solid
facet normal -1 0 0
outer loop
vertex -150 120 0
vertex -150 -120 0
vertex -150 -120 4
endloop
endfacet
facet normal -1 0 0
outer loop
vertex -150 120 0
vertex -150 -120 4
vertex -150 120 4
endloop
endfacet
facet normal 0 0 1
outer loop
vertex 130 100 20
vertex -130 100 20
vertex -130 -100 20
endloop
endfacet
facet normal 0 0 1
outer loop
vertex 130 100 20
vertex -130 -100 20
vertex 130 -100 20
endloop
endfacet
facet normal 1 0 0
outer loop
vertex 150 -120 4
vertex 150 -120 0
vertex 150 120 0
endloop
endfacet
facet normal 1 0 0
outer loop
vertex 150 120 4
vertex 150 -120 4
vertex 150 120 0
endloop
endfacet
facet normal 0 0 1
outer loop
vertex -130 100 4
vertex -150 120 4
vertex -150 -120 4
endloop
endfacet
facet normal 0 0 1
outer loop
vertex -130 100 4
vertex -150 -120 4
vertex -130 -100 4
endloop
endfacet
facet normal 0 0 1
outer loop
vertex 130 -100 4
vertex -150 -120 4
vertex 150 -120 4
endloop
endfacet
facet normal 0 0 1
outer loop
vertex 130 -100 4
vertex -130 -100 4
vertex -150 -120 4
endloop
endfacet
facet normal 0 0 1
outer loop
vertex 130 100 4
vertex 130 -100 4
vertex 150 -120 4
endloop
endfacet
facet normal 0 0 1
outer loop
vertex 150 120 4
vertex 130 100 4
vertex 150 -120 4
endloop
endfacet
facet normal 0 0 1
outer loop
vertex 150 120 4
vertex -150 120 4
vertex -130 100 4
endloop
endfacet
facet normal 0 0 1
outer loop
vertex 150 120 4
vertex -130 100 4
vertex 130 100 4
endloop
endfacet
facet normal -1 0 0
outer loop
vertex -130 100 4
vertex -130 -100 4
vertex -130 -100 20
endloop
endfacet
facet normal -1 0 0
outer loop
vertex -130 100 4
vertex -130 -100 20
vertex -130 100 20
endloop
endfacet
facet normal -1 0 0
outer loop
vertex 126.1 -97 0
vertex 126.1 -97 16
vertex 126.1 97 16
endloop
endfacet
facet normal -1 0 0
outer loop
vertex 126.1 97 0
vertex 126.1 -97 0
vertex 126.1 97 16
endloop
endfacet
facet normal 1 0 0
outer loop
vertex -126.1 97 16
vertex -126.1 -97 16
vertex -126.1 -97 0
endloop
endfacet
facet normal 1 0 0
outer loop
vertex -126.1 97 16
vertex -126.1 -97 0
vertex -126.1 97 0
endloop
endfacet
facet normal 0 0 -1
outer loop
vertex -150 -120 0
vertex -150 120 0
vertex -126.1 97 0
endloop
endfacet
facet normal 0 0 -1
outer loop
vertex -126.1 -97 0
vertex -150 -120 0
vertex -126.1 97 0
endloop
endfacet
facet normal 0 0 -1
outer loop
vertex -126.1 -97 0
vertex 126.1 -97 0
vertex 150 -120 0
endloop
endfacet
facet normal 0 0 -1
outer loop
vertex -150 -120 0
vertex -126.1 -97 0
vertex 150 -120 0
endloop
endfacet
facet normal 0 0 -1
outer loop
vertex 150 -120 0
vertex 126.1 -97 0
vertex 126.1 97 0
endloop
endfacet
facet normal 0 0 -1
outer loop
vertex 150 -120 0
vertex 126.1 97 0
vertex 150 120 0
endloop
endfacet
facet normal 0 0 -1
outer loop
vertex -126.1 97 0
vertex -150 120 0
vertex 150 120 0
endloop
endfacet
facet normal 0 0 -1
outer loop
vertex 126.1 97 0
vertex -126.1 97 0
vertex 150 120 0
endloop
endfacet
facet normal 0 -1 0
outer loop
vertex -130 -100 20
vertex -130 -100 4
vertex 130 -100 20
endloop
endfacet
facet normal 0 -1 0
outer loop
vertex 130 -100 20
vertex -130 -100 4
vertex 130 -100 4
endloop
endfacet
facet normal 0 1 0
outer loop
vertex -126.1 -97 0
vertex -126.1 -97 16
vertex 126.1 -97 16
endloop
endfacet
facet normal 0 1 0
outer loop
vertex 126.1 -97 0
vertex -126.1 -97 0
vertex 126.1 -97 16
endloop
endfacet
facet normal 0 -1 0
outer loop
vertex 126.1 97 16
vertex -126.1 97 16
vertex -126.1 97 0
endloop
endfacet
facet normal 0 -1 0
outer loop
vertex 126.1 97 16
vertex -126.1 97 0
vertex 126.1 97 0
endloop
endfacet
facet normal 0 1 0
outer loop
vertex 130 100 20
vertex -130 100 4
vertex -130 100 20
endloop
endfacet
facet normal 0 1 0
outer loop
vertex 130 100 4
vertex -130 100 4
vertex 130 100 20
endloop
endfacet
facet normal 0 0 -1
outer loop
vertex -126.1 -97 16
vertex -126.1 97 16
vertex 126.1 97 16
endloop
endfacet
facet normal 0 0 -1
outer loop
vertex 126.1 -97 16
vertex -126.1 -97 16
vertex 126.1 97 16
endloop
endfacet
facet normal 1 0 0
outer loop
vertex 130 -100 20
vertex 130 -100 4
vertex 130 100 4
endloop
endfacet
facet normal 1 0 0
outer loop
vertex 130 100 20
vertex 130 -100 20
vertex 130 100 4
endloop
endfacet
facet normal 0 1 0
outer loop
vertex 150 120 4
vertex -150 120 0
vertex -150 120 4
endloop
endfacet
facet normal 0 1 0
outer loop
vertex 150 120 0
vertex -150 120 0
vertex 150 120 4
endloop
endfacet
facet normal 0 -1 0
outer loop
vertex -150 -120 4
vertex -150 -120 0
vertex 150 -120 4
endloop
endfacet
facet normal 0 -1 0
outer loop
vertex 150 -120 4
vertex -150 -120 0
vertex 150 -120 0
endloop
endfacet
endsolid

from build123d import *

# Parameters (mm, degrees)
SKETCH1_W                = 300
SKETCH1_H                = 240
SKETCH1_W_2              = 260
SKETCH1_H_2              = 200
BOSS_EXTRUDE1_DEPTH      = 4
SKETCH2_W                = 260
SKETCH2_H                = 200
SKETCH2_W_2              = 252.2
SKETCH2_H_2              = 194
BOSS_EXTRUDE3_DEPTH      = 16
BOSS_EXTRUDE3_DEPTH_BACK = 4
SKETCH4_W                = 252.2
SKETCH4_H                = 194
BOSS_EXTRUDE4_DEPTH      = 4


with BuildPart() as part:
    # Sketch1 → Boss-Extrude1 (new body)
    with BuildSketch(Plane.XY):
        Rectangle(SKETCH1_W, SKETCH1_H)
        Rectangle(SKETCH1_W_2, SKETCH1_H_2, mode=Mode.SUBTRACT)
    extrude(amount=BOSS_EXTRUDE1_DEPTH)

    # Sketch2 → Boss-Extrude3 (add, two sides)
    with BuildSketch(Plane.XY.offset(4)) as boss_extrude3_sk:
        Rectangle(SKETCH2_W, SKETCH2_H)
        Rectangle(SKETCH2_W_2, SKETCH2_H_2, mode=Mode.SUBTRACT)
    extrude(amount=BOSS_EXTRUDE3_DEPTH)
    extrude(boss_extrude3_sk.sketch, amount=-BOSS_EXTRUDE3_DEPTH_BACK)

    # Sketch4 → Boss-Extrude4 (add)
    with BuildSketch(Plane.XY.offset(20)):
        Rectangle(SKETCH4_W, SKETCH4_H)
    extrude(amount=-BOSS_EXTRUDE4_DEPTH)


solid = part.part
